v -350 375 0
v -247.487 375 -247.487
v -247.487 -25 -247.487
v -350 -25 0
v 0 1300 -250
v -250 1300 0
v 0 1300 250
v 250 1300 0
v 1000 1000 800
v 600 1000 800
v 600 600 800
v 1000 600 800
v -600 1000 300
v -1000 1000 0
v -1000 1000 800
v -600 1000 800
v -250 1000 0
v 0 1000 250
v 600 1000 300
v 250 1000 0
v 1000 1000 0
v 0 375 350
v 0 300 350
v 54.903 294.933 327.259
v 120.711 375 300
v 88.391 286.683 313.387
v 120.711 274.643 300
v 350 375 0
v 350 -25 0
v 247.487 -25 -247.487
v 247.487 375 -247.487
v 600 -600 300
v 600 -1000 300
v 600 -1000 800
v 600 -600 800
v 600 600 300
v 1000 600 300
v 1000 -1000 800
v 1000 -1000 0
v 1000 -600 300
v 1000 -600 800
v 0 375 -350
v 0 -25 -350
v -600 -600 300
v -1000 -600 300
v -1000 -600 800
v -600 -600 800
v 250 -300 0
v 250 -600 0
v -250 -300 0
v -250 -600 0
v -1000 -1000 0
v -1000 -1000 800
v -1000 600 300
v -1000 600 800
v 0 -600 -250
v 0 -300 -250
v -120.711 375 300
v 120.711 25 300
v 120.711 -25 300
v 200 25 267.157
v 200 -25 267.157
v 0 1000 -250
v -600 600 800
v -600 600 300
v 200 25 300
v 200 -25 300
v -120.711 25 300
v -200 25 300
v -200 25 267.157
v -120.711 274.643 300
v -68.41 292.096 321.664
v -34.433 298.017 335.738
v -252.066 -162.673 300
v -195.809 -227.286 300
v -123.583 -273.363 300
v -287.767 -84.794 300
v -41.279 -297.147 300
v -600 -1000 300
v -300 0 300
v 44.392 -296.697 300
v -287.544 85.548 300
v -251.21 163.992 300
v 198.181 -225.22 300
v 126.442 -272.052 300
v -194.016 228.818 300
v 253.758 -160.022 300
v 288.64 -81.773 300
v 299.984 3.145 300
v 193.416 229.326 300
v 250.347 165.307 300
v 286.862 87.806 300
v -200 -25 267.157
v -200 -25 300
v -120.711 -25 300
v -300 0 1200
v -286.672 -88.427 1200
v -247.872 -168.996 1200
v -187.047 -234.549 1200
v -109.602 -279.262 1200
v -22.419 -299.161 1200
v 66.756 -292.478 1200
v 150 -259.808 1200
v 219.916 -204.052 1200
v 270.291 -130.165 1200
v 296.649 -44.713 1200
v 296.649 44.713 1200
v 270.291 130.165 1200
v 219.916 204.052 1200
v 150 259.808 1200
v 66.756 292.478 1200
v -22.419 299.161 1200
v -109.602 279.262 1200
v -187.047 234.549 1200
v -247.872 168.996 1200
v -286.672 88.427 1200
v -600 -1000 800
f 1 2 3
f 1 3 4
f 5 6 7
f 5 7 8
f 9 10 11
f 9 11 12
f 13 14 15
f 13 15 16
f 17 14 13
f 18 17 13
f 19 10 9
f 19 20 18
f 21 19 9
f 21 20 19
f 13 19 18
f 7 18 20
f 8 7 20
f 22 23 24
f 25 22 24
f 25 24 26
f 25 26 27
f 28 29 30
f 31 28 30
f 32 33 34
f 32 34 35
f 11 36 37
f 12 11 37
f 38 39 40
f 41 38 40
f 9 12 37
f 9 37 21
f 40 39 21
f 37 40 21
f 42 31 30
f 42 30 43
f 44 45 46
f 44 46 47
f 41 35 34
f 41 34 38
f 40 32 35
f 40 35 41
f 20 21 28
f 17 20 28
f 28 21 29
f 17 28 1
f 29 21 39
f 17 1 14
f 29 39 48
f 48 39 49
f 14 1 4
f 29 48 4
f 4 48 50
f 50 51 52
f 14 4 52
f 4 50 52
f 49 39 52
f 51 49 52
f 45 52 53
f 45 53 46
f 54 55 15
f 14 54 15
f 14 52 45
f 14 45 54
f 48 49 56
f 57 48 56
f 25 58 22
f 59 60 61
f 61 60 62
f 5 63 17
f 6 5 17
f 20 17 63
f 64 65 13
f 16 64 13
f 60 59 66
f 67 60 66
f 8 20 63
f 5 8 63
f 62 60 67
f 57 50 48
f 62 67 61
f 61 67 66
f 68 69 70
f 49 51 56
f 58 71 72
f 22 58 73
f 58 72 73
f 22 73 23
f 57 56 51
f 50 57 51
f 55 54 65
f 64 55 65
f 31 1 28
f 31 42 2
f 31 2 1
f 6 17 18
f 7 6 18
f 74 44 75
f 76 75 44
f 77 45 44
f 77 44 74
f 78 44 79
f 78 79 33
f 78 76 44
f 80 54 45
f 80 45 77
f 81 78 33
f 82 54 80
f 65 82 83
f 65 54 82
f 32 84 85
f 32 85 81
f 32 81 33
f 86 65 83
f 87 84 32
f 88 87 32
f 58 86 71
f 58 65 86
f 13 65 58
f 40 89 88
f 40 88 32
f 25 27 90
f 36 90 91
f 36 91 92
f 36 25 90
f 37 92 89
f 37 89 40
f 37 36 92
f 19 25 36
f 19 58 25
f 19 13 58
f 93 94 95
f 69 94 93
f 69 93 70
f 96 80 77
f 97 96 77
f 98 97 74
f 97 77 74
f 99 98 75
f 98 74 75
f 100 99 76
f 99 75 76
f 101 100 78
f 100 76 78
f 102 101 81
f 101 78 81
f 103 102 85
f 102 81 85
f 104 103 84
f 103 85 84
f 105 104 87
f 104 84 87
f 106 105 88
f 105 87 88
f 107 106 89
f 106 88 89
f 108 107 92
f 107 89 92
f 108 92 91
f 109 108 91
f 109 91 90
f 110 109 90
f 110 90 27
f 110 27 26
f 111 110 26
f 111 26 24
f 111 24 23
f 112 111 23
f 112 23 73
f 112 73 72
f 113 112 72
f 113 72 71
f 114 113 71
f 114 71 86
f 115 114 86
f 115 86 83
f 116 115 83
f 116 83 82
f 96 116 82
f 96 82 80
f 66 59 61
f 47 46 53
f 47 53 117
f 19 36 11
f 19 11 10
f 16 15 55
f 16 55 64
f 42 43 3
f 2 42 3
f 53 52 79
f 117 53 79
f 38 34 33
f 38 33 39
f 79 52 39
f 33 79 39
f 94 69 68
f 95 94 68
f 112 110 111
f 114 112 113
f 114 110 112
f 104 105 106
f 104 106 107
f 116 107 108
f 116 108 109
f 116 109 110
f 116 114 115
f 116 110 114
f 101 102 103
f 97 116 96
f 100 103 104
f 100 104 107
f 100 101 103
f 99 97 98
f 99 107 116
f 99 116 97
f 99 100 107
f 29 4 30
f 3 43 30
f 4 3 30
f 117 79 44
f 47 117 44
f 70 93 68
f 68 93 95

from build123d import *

# Parameters (mm, degrees)
SKETCH_1_W          = 2000
SKETCH_1_H          = 2000
EXTRUDE_1_DEPTH     = 300
SKETCH_2_W          = 400
SKETCH_2_H          = 400
EXTRUDE_2_DEPTH     = 800
SKETCH_3_W          = 400
SKETCH_3_H          = 400
EXTRUDE_3_DEPTH     = 800
SKETCH_4_W          = 400
SKETCH_4_H          = 400
EXTRUDE_4_DEPTH     = 800
SKETCH_5_W          = 400
SKETCH_5_H          = 400
EXTRUDE_5_DEPTH     = 800
SKETCH_6_R          = 300
EXTRUDE_6_DEPTH     = 1200
SKETCH_7_W          = 400
SKETCH_7_H          = 50
CUT_EXTRUDE_1_DEPTH = 1677.305461424
EXTRUDE_7_DEPTH     = 300
EXTRUDE_8_DEPTH     = 300
EXTRUDE_9_DEPTH     = 300
EXTRUDE_10_DEPTH    = 300
EXTRUDE_11_DEPTH    = 400


with BuildPart() as part:
    # 草图1 → 凸台-拉伸1 (new body)
    with BuildSketch(Plane.XY):
        Rectangle(SKETCH_1_W, SKETCH_1_H)
    extrude(amount=EXTRUDE_1_DEPTH)

    # 草图2 → 凸台-拉伸2 (add)
    with BuildSketch(Plane.XY):
        with Locations((-800, -800)):
            Rectangle(SKETCH_2_W, SKETCH_2_H)
    extrude(amount=EXTRUDE_2_DEPTH)

    # 草图3 → 凸台-拉伸3 (add)
    with BuildSketch(Plane.XY):
        with Locations((800, -800)):
            Rectangle(SKETCH_3_W, SKETCH_3_H)
    extrude(amount=EXTRUDE_3_DEPTH)

    # 草图4 → 凸台-拉伸4 (add)
    with BuildSketch(Plane.XY):
        with Locations((-800, 800)):
            Rectangle(SKETCH_4_W, SKETCH_4_H)
    extrude(amount=EXTRUDE_4_DEPTH)

    # 草图5 → 凸台-拉伸5 (add)
    with BuildSketch(Plane.XY):
        with Locations((800, 800)):
            Rectangle(SKETCH_5_W, SKETCH_5_H)
    extrude(amount=EXTRUDE_5_DEPTH)

    # 草图6 → 凸台-拉伸6 (add)
    with BuildSketch(Plane.XY):
        with Locations(Location((0, 0, 0), (0, 0, 180))):
            Circle(SKETCH_6_R)
    extrude(amount=EXTRUDE_6_DEPTH)

    # 草图7 → 切除-拉伸1 (cut, through all)
    with BuildSketch(Plane.XY.offset(300)):
        Rectangle(SKETCH_7_W, SKETCH_7_H)
    extrude(amount=-CUT_EXTRUDE_1_DEPTH, mode=Mode.SUBTRACT)

    # 草图8 → 凸台-拉伸7 (add)
    with BuildSketch(Plane(origin=(0, -600, 0), x_dir=(1, 0, 0), z_dir=(0, 1, 0))):
        Polygon((250, 0), (0, 250), (-250, 0), (0, -250), align=None)
    extrude(amount=EXTRUDE_7_DEPTH)

    # 草图9 → 凸台-拉伸8 (add)
    with BuildSketch(Plane(origin=(0, -600, 0), x_dir=(1, 0, 0), z_dir=(0, 1, 0))):
        Polygon((250, 0), (0, 250), (-250, 0), (0, -250), align=None)
    extrude(amount=EXTRUDE_8_DEPTH)

    # 草图10 → 凸台-拉伸9 (add)
    with BuildSketch(Plane(origin=(0, 1000, 0), x_dir=(1, 0, 0), z_dir=(0, 1, 0))):
        Polygon((250, 0), (0, 250), (-250, 0), (0, -250), align=None)
    extrude(amount=EXTRUDE_9_DEPTH)

    # 草图11 → 凸台-拉伸10 (add)
    with BuildSketch(Plane(origin=(0, 1000, 0), x_dir=(1, 0, 0), z_dir=(0, 1, 0))):
        Polygon((250, 0), (0, 250), (-250, 0), (0, -250), align=None)
    extrude(amount=EXTRUDE_10_DEPTH)

    # 草图12 → 凸台-拉伸11 (add)
    with BuildSketch(Plane(origin=(0, -25, 0), x_dir=(1, 0, 0), z_dir=(0, 1, 0))):
        Polygon((350, 0), (247.487373415, 247.487373415), (0, 350), (-247.487373415, 247.487373415), (-350, 0), (-247.487373415, -247.487373415), (0, -350), (247.487373415, -247.487373415), align=None)
    extrude(amount=EXTRUDE_11_DEPTH)


solid = part.part
